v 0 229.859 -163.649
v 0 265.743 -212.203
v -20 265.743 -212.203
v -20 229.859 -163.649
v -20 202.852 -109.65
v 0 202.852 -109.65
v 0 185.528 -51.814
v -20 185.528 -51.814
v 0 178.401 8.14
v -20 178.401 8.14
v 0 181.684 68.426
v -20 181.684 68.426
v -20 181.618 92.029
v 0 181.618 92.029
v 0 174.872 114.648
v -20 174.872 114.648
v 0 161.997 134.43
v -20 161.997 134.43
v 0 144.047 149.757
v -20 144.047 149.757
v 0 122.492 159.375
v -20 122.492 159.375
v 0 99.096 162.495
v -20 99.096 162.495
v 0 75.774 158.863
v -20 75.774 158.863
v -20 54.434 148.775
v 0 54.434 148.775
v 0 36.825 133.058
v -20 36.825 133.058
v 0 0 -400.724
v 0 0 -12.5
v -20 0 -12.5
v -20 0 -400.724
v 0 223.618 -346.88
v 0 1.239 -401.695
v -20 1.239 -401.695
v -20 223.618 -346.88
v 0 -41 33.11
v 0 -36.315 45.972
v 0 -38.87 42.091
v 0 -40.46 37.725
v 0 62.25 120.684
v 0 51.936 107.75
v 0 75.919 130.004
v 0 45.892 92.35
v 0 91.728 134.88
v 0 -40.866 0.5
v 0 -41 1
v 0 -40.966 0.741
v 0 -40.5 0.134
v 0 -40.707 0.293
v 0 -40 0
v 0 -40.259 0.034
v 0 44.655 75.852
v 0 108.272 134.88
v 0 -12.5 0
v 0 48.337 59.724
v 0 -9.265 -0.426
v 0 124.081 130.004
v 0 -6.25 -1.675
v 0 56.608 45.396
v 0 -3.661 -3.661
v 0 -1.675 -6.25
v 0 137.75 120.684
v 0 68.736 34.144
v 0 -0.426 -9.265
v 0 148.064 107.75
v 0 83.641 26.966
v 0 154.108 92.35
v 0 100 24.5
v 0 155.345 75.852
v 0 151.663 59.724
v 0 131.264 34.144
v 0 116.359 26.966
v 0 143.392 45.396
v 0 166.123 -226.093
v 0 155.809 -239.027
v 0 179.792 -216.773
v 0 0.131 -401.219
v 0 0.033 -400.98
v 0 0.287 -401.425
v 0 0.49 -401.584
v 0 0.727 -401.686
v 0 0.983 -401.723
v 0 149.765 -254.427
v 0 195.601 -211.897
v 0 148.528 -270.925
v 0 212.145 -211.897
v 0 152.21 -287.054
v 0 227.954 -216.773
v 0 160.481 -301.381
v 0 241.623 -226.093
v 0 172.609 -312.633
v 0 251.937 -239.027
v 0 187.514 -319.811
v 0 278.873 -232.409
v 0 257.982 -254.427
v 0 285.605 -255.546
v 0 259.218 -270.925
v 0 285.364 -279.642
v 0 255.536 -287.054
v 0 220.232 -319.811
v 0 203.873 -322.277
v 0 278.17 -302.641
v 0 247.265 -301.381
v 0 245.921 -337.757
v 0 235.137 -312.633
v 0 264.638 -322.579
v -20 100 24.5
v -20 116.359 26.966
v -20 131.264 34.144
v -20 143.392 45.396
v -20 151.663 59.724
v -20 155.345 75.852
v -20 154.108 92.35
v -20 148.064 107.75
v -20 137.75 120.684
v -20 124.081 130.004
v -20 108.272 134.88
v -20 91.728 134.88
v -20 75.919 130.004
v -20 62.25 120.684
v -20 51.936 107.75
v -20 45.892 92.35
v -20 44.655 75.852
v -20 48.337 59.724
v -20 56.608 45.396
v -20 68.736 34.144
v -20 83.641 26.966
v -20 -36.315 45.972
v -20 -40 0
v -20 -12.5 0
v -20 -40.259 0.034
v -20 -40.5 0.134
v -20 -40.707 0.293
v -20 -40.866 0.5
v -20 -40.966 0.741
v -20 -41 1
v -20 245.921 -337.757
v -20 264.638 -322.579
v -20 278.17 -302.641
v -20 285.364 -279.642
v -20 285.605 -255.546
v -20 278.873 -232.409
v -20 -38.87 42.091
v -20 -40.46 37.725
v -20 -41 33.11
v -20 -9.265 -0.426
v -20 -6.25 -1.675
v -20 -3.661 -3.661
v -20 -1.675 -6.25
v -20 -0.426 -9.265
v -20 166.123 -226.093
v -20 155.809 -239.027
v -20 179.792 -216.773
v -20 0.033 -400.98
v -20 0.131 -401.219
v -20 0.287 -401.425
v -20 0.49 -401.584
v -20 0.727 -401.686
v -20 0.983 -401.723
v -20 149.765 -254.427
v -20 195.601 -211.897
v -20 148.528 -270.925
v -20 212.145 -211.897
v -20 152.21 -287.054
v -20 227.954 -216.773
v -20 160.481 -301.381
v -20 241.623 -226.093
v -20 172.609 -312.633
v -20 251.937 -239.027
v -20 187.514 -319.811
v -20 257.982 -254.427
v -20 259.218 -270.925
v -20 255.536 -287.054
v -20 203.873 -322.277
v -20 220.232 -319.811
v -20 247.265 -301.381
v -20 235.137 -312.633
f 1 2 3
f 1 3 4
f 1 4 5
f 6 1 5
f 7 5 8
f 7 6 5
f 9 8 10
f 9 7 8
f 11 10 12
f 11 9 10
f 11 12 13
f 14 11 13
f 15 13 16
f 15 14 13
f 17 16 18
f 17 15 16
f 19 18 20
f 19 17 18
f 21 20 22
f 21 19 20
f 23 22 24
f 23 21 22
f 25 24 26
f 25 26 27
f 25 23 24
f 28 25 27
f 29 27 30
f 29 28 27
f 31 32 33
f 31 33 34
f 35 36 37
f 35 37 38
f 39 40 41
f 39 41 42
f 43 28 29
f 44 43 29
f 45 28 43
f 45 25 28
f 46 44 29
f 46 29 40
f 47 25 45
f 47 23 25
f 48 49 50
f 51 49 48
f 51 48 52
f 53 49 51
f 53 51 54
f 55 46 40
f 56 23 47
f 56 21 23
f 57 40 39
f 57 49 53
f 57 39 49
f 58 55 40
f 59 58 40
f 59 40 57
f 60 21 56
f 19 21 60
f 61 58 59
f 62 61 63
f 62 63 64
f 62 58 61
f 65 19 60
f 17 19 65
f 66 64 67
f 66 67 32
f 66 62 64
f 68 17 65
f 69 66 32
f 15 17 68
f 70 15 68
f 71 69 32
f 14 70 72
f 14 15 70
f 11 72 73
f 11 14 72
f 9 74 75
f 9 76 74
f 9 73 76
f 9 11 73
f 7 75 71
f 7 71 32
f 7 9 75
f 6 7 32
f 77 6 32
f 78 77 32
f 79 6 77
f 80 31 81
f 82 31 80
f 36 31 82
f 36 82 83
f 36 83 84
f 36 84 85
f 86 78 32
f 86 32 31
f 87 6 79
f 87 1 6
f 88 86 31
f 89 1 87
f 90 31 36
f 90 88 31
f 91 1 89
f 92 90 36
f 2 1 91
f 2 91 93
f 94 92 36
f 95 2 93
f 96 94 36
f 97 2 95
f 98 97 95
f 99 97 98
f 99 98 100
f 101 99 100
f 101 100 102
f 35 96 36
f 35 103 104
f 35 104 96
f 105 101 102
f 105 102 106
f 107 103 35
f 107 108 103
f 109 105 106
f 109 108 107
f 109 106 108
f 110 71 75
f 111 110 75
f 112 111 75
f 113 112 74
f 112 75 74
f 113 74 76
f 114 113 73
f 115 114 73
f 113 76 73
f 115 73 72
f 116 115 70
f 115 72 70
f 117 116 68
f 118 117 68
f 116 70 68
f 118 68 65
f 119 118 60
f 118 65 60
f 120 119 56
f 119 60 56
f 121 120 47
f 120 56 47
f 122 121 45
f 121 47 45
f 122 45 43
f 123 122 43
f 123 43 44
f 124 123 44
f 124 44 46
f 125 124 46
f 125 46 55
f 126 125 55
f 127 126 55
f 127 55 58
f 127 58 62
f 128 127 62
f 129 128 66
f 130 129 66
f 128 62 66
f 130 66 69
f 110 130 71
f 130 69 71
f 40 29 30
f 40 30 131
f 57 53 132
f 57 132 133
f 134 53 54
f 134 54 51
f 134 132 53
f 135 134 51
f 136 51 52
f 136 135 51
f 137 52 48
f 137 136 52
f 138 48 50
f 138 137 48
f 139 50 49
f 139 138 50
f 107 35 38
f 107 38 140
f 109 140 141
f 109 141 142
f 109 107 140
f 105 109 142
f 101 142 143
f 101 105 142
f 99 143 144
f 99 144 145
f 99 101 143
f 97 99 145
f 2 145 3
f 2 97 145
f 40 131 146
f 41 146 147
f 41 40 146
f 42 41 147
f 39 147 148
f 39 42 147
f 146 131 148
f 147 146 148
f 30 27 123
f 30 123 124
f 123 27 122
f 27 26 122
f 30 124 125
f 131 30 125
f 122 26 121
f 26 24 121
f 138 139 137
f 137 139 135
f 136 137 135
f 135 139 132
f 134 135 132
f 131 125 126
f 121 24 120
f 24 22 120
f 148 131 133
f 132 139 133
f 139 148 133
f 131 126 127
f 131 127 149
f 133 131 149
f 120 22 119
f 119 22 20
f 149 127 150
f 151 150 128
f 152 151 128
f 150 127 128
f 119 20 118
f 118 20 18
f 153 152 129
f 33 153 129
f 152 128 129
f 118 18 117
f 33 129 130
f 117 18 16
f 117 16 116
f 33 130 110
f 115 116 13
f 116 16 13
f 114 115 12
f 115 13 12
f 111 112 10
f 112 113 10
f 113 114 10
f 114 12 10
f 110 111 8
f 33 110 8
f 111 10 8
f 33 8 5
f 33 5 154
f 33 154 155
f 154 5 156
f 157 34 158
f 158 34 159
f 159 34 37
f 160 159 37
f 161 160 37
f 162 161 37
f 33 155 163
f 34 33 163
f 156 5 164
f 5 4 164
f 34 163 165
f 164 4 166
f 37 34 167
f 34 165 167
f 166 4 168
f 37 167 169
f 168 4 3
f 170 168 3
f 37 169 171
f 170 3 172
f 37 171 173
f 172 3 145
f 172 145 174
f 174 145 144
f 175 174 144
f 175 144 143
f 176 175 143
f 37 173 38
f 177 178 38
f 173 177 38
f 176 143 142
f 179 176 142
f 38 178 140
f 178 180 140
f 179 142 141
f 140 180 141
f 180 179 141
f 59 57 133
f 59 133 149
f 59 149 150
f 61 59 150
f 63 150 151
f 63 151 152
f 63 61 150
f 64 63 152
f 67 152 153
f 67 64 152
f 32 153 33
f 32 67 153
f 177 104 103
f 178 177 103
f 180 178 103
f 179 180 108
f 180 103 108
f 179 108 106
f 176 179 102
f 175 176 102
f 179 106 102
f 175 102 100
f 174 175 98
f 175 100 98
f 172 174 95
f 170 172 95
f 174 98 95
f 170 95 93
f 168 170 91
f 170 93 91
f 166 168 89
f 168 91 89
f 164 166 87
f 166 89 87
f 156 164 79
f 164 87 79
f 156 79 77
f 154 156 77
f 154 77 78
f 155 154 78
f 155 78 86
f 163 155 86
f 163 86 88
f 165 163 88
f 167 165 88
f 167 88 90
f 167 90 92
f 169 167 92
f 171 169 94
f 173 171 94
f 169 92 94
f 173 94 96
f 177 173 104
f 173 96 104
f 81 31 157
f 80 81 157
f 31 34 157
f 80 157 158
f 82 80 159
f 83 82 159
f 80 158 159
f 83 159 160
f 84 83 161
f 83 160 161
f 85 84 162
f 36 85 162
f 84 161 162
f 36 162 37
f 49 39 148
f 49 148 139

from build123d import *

# Parameters (mm, degrees)
SKETCH1_R          = 55.5
BASE_FLANGE1_DEPTH = 20
FILLET_1_0_R       = 1


# Sheet-metal steps are written as plain solids
with BuildPart() as part:
    # Sketch1 → Base-Flange1 (new body)
    with BuildSketch(Plane(origin=(0, 0, 0), x_dir=(0, 0, -1), z_dir=(1, 0, 0))):
        with BuildLine():
            Line((0, -41), (0, -12.5))
            ThreePointArc((0, -12.5), (3.661165235, -3.661165235), (12.5, 0))
            Line((12.5, 0), (402, 0))
            Line((402, 0), (346.87955959, 223.617766639))
            ThreePointArc((346.87955959, 223.617766639), (291.405611492, 282.611111197), (212.20304892, 265.743162247))
            ThreePointArc((212.20304892, 265.743162247), (81.106216912, 192.940833045), (-68.425866876, 181.684083165))
            ThreePointArc((-68.425866876, 181.684083165), (-155.341011221, 133.615205312), (-133.058215758, 36.825038658))
            Line((-133.058215758, 36.825038658), (-45.972209781, -36.315142143))
            ThreePointArc((-45.972209781, -36.315142143), (-39.95421417, -39.792323471), (-33.109612021, -41))
            Line((-33.109612021, -41), (0, -41))
        make_face()
        with Locations((-80, 100)):
            Circle(SKETCH1_R, mode=Mode.SUBTRACT)
        with Locations((266.777160234, 203.873004866)):
            Circle(SKETCH1_R, mode=Mode.SUBTRACT)
    extrude(amount=-BASE_FLANGE1_DEPTH)

    # Fillet-1.0
    fillet_1_0_edges = [part.edges().sort_by_distance(p)[0] for p in [
        (-10, 0, -402),
        (-10, -41, 0),
    ]]
    fillet(fillet_1_0_edges, radius=FILLET_1_0_R)


solid = part.part
